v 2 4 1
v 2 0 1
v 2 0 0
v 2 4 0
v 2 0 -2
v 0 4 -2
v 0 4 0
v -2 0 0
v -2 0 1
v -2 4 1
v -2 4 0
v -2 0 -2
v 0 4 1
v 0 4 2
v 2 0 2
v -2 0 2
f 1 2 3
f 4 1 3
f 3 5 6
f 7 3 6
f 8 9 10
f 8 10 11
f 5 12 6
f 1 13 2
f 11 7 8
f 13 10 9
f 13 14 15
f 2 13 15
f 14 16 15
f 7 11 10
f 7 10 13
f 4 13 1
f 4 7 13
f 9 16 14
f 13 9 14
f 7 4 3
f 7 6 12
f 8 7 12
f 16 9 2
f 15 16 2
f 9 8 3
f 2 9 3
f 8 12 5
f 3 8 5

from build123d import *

# Parameters (mm, degrees)
SKETCH1_W           = 4
SKETCH1_H           = 4
BOSS_EXTRUDE1_DEPTH = 4
CUT_EXTRUDE3_DEPTH  = 1
CUT_EXTRUDE5_DEPTH  = 2


with BuildPart() as part:
    # Sketch1 → Boss-Extrude1 (new body)
    with BuildSketch(Plane(origin=(0, 0, 0), x_dir=(1, 0, 0), z_dir=(0, 1, 0))):
        Rectangle(SKETCH1_W, SKETCH1_H)
    extrude(amount=BOSS_EXTRUDE1_DEPTH)

    # Sketch6 → Cut-Extrude3 (cut)
    with BuildSketch(Plane.XY.offset(2)):
        Polygon((-2, 0), (0, 4), (-2, 4), align=None)
        Polygon((2, 4), (0, 4), (2, 0), align=None)
    extrude(amount=-CUT_EXTRUDE3_DEPTH, mode=Mode.SUBTRACT)

    # Sketch8 → Cut-Extrude5 (cut)
    with BuildSketch(Plane(origin=(0, 0, -2), x_dir=(-1, 0, 0), z_dir=(0, 0, -1))):
        Polygon((-2, 4), (-2, 0), (0, 4), align=None)
        Polygon((2, 4), (0, 4), (2, 0), align=None)
    extrude(amount=-CUT_EXTRUDE5_DEPTH, mode=Mode.SUBTRACT)


solid = part.part
